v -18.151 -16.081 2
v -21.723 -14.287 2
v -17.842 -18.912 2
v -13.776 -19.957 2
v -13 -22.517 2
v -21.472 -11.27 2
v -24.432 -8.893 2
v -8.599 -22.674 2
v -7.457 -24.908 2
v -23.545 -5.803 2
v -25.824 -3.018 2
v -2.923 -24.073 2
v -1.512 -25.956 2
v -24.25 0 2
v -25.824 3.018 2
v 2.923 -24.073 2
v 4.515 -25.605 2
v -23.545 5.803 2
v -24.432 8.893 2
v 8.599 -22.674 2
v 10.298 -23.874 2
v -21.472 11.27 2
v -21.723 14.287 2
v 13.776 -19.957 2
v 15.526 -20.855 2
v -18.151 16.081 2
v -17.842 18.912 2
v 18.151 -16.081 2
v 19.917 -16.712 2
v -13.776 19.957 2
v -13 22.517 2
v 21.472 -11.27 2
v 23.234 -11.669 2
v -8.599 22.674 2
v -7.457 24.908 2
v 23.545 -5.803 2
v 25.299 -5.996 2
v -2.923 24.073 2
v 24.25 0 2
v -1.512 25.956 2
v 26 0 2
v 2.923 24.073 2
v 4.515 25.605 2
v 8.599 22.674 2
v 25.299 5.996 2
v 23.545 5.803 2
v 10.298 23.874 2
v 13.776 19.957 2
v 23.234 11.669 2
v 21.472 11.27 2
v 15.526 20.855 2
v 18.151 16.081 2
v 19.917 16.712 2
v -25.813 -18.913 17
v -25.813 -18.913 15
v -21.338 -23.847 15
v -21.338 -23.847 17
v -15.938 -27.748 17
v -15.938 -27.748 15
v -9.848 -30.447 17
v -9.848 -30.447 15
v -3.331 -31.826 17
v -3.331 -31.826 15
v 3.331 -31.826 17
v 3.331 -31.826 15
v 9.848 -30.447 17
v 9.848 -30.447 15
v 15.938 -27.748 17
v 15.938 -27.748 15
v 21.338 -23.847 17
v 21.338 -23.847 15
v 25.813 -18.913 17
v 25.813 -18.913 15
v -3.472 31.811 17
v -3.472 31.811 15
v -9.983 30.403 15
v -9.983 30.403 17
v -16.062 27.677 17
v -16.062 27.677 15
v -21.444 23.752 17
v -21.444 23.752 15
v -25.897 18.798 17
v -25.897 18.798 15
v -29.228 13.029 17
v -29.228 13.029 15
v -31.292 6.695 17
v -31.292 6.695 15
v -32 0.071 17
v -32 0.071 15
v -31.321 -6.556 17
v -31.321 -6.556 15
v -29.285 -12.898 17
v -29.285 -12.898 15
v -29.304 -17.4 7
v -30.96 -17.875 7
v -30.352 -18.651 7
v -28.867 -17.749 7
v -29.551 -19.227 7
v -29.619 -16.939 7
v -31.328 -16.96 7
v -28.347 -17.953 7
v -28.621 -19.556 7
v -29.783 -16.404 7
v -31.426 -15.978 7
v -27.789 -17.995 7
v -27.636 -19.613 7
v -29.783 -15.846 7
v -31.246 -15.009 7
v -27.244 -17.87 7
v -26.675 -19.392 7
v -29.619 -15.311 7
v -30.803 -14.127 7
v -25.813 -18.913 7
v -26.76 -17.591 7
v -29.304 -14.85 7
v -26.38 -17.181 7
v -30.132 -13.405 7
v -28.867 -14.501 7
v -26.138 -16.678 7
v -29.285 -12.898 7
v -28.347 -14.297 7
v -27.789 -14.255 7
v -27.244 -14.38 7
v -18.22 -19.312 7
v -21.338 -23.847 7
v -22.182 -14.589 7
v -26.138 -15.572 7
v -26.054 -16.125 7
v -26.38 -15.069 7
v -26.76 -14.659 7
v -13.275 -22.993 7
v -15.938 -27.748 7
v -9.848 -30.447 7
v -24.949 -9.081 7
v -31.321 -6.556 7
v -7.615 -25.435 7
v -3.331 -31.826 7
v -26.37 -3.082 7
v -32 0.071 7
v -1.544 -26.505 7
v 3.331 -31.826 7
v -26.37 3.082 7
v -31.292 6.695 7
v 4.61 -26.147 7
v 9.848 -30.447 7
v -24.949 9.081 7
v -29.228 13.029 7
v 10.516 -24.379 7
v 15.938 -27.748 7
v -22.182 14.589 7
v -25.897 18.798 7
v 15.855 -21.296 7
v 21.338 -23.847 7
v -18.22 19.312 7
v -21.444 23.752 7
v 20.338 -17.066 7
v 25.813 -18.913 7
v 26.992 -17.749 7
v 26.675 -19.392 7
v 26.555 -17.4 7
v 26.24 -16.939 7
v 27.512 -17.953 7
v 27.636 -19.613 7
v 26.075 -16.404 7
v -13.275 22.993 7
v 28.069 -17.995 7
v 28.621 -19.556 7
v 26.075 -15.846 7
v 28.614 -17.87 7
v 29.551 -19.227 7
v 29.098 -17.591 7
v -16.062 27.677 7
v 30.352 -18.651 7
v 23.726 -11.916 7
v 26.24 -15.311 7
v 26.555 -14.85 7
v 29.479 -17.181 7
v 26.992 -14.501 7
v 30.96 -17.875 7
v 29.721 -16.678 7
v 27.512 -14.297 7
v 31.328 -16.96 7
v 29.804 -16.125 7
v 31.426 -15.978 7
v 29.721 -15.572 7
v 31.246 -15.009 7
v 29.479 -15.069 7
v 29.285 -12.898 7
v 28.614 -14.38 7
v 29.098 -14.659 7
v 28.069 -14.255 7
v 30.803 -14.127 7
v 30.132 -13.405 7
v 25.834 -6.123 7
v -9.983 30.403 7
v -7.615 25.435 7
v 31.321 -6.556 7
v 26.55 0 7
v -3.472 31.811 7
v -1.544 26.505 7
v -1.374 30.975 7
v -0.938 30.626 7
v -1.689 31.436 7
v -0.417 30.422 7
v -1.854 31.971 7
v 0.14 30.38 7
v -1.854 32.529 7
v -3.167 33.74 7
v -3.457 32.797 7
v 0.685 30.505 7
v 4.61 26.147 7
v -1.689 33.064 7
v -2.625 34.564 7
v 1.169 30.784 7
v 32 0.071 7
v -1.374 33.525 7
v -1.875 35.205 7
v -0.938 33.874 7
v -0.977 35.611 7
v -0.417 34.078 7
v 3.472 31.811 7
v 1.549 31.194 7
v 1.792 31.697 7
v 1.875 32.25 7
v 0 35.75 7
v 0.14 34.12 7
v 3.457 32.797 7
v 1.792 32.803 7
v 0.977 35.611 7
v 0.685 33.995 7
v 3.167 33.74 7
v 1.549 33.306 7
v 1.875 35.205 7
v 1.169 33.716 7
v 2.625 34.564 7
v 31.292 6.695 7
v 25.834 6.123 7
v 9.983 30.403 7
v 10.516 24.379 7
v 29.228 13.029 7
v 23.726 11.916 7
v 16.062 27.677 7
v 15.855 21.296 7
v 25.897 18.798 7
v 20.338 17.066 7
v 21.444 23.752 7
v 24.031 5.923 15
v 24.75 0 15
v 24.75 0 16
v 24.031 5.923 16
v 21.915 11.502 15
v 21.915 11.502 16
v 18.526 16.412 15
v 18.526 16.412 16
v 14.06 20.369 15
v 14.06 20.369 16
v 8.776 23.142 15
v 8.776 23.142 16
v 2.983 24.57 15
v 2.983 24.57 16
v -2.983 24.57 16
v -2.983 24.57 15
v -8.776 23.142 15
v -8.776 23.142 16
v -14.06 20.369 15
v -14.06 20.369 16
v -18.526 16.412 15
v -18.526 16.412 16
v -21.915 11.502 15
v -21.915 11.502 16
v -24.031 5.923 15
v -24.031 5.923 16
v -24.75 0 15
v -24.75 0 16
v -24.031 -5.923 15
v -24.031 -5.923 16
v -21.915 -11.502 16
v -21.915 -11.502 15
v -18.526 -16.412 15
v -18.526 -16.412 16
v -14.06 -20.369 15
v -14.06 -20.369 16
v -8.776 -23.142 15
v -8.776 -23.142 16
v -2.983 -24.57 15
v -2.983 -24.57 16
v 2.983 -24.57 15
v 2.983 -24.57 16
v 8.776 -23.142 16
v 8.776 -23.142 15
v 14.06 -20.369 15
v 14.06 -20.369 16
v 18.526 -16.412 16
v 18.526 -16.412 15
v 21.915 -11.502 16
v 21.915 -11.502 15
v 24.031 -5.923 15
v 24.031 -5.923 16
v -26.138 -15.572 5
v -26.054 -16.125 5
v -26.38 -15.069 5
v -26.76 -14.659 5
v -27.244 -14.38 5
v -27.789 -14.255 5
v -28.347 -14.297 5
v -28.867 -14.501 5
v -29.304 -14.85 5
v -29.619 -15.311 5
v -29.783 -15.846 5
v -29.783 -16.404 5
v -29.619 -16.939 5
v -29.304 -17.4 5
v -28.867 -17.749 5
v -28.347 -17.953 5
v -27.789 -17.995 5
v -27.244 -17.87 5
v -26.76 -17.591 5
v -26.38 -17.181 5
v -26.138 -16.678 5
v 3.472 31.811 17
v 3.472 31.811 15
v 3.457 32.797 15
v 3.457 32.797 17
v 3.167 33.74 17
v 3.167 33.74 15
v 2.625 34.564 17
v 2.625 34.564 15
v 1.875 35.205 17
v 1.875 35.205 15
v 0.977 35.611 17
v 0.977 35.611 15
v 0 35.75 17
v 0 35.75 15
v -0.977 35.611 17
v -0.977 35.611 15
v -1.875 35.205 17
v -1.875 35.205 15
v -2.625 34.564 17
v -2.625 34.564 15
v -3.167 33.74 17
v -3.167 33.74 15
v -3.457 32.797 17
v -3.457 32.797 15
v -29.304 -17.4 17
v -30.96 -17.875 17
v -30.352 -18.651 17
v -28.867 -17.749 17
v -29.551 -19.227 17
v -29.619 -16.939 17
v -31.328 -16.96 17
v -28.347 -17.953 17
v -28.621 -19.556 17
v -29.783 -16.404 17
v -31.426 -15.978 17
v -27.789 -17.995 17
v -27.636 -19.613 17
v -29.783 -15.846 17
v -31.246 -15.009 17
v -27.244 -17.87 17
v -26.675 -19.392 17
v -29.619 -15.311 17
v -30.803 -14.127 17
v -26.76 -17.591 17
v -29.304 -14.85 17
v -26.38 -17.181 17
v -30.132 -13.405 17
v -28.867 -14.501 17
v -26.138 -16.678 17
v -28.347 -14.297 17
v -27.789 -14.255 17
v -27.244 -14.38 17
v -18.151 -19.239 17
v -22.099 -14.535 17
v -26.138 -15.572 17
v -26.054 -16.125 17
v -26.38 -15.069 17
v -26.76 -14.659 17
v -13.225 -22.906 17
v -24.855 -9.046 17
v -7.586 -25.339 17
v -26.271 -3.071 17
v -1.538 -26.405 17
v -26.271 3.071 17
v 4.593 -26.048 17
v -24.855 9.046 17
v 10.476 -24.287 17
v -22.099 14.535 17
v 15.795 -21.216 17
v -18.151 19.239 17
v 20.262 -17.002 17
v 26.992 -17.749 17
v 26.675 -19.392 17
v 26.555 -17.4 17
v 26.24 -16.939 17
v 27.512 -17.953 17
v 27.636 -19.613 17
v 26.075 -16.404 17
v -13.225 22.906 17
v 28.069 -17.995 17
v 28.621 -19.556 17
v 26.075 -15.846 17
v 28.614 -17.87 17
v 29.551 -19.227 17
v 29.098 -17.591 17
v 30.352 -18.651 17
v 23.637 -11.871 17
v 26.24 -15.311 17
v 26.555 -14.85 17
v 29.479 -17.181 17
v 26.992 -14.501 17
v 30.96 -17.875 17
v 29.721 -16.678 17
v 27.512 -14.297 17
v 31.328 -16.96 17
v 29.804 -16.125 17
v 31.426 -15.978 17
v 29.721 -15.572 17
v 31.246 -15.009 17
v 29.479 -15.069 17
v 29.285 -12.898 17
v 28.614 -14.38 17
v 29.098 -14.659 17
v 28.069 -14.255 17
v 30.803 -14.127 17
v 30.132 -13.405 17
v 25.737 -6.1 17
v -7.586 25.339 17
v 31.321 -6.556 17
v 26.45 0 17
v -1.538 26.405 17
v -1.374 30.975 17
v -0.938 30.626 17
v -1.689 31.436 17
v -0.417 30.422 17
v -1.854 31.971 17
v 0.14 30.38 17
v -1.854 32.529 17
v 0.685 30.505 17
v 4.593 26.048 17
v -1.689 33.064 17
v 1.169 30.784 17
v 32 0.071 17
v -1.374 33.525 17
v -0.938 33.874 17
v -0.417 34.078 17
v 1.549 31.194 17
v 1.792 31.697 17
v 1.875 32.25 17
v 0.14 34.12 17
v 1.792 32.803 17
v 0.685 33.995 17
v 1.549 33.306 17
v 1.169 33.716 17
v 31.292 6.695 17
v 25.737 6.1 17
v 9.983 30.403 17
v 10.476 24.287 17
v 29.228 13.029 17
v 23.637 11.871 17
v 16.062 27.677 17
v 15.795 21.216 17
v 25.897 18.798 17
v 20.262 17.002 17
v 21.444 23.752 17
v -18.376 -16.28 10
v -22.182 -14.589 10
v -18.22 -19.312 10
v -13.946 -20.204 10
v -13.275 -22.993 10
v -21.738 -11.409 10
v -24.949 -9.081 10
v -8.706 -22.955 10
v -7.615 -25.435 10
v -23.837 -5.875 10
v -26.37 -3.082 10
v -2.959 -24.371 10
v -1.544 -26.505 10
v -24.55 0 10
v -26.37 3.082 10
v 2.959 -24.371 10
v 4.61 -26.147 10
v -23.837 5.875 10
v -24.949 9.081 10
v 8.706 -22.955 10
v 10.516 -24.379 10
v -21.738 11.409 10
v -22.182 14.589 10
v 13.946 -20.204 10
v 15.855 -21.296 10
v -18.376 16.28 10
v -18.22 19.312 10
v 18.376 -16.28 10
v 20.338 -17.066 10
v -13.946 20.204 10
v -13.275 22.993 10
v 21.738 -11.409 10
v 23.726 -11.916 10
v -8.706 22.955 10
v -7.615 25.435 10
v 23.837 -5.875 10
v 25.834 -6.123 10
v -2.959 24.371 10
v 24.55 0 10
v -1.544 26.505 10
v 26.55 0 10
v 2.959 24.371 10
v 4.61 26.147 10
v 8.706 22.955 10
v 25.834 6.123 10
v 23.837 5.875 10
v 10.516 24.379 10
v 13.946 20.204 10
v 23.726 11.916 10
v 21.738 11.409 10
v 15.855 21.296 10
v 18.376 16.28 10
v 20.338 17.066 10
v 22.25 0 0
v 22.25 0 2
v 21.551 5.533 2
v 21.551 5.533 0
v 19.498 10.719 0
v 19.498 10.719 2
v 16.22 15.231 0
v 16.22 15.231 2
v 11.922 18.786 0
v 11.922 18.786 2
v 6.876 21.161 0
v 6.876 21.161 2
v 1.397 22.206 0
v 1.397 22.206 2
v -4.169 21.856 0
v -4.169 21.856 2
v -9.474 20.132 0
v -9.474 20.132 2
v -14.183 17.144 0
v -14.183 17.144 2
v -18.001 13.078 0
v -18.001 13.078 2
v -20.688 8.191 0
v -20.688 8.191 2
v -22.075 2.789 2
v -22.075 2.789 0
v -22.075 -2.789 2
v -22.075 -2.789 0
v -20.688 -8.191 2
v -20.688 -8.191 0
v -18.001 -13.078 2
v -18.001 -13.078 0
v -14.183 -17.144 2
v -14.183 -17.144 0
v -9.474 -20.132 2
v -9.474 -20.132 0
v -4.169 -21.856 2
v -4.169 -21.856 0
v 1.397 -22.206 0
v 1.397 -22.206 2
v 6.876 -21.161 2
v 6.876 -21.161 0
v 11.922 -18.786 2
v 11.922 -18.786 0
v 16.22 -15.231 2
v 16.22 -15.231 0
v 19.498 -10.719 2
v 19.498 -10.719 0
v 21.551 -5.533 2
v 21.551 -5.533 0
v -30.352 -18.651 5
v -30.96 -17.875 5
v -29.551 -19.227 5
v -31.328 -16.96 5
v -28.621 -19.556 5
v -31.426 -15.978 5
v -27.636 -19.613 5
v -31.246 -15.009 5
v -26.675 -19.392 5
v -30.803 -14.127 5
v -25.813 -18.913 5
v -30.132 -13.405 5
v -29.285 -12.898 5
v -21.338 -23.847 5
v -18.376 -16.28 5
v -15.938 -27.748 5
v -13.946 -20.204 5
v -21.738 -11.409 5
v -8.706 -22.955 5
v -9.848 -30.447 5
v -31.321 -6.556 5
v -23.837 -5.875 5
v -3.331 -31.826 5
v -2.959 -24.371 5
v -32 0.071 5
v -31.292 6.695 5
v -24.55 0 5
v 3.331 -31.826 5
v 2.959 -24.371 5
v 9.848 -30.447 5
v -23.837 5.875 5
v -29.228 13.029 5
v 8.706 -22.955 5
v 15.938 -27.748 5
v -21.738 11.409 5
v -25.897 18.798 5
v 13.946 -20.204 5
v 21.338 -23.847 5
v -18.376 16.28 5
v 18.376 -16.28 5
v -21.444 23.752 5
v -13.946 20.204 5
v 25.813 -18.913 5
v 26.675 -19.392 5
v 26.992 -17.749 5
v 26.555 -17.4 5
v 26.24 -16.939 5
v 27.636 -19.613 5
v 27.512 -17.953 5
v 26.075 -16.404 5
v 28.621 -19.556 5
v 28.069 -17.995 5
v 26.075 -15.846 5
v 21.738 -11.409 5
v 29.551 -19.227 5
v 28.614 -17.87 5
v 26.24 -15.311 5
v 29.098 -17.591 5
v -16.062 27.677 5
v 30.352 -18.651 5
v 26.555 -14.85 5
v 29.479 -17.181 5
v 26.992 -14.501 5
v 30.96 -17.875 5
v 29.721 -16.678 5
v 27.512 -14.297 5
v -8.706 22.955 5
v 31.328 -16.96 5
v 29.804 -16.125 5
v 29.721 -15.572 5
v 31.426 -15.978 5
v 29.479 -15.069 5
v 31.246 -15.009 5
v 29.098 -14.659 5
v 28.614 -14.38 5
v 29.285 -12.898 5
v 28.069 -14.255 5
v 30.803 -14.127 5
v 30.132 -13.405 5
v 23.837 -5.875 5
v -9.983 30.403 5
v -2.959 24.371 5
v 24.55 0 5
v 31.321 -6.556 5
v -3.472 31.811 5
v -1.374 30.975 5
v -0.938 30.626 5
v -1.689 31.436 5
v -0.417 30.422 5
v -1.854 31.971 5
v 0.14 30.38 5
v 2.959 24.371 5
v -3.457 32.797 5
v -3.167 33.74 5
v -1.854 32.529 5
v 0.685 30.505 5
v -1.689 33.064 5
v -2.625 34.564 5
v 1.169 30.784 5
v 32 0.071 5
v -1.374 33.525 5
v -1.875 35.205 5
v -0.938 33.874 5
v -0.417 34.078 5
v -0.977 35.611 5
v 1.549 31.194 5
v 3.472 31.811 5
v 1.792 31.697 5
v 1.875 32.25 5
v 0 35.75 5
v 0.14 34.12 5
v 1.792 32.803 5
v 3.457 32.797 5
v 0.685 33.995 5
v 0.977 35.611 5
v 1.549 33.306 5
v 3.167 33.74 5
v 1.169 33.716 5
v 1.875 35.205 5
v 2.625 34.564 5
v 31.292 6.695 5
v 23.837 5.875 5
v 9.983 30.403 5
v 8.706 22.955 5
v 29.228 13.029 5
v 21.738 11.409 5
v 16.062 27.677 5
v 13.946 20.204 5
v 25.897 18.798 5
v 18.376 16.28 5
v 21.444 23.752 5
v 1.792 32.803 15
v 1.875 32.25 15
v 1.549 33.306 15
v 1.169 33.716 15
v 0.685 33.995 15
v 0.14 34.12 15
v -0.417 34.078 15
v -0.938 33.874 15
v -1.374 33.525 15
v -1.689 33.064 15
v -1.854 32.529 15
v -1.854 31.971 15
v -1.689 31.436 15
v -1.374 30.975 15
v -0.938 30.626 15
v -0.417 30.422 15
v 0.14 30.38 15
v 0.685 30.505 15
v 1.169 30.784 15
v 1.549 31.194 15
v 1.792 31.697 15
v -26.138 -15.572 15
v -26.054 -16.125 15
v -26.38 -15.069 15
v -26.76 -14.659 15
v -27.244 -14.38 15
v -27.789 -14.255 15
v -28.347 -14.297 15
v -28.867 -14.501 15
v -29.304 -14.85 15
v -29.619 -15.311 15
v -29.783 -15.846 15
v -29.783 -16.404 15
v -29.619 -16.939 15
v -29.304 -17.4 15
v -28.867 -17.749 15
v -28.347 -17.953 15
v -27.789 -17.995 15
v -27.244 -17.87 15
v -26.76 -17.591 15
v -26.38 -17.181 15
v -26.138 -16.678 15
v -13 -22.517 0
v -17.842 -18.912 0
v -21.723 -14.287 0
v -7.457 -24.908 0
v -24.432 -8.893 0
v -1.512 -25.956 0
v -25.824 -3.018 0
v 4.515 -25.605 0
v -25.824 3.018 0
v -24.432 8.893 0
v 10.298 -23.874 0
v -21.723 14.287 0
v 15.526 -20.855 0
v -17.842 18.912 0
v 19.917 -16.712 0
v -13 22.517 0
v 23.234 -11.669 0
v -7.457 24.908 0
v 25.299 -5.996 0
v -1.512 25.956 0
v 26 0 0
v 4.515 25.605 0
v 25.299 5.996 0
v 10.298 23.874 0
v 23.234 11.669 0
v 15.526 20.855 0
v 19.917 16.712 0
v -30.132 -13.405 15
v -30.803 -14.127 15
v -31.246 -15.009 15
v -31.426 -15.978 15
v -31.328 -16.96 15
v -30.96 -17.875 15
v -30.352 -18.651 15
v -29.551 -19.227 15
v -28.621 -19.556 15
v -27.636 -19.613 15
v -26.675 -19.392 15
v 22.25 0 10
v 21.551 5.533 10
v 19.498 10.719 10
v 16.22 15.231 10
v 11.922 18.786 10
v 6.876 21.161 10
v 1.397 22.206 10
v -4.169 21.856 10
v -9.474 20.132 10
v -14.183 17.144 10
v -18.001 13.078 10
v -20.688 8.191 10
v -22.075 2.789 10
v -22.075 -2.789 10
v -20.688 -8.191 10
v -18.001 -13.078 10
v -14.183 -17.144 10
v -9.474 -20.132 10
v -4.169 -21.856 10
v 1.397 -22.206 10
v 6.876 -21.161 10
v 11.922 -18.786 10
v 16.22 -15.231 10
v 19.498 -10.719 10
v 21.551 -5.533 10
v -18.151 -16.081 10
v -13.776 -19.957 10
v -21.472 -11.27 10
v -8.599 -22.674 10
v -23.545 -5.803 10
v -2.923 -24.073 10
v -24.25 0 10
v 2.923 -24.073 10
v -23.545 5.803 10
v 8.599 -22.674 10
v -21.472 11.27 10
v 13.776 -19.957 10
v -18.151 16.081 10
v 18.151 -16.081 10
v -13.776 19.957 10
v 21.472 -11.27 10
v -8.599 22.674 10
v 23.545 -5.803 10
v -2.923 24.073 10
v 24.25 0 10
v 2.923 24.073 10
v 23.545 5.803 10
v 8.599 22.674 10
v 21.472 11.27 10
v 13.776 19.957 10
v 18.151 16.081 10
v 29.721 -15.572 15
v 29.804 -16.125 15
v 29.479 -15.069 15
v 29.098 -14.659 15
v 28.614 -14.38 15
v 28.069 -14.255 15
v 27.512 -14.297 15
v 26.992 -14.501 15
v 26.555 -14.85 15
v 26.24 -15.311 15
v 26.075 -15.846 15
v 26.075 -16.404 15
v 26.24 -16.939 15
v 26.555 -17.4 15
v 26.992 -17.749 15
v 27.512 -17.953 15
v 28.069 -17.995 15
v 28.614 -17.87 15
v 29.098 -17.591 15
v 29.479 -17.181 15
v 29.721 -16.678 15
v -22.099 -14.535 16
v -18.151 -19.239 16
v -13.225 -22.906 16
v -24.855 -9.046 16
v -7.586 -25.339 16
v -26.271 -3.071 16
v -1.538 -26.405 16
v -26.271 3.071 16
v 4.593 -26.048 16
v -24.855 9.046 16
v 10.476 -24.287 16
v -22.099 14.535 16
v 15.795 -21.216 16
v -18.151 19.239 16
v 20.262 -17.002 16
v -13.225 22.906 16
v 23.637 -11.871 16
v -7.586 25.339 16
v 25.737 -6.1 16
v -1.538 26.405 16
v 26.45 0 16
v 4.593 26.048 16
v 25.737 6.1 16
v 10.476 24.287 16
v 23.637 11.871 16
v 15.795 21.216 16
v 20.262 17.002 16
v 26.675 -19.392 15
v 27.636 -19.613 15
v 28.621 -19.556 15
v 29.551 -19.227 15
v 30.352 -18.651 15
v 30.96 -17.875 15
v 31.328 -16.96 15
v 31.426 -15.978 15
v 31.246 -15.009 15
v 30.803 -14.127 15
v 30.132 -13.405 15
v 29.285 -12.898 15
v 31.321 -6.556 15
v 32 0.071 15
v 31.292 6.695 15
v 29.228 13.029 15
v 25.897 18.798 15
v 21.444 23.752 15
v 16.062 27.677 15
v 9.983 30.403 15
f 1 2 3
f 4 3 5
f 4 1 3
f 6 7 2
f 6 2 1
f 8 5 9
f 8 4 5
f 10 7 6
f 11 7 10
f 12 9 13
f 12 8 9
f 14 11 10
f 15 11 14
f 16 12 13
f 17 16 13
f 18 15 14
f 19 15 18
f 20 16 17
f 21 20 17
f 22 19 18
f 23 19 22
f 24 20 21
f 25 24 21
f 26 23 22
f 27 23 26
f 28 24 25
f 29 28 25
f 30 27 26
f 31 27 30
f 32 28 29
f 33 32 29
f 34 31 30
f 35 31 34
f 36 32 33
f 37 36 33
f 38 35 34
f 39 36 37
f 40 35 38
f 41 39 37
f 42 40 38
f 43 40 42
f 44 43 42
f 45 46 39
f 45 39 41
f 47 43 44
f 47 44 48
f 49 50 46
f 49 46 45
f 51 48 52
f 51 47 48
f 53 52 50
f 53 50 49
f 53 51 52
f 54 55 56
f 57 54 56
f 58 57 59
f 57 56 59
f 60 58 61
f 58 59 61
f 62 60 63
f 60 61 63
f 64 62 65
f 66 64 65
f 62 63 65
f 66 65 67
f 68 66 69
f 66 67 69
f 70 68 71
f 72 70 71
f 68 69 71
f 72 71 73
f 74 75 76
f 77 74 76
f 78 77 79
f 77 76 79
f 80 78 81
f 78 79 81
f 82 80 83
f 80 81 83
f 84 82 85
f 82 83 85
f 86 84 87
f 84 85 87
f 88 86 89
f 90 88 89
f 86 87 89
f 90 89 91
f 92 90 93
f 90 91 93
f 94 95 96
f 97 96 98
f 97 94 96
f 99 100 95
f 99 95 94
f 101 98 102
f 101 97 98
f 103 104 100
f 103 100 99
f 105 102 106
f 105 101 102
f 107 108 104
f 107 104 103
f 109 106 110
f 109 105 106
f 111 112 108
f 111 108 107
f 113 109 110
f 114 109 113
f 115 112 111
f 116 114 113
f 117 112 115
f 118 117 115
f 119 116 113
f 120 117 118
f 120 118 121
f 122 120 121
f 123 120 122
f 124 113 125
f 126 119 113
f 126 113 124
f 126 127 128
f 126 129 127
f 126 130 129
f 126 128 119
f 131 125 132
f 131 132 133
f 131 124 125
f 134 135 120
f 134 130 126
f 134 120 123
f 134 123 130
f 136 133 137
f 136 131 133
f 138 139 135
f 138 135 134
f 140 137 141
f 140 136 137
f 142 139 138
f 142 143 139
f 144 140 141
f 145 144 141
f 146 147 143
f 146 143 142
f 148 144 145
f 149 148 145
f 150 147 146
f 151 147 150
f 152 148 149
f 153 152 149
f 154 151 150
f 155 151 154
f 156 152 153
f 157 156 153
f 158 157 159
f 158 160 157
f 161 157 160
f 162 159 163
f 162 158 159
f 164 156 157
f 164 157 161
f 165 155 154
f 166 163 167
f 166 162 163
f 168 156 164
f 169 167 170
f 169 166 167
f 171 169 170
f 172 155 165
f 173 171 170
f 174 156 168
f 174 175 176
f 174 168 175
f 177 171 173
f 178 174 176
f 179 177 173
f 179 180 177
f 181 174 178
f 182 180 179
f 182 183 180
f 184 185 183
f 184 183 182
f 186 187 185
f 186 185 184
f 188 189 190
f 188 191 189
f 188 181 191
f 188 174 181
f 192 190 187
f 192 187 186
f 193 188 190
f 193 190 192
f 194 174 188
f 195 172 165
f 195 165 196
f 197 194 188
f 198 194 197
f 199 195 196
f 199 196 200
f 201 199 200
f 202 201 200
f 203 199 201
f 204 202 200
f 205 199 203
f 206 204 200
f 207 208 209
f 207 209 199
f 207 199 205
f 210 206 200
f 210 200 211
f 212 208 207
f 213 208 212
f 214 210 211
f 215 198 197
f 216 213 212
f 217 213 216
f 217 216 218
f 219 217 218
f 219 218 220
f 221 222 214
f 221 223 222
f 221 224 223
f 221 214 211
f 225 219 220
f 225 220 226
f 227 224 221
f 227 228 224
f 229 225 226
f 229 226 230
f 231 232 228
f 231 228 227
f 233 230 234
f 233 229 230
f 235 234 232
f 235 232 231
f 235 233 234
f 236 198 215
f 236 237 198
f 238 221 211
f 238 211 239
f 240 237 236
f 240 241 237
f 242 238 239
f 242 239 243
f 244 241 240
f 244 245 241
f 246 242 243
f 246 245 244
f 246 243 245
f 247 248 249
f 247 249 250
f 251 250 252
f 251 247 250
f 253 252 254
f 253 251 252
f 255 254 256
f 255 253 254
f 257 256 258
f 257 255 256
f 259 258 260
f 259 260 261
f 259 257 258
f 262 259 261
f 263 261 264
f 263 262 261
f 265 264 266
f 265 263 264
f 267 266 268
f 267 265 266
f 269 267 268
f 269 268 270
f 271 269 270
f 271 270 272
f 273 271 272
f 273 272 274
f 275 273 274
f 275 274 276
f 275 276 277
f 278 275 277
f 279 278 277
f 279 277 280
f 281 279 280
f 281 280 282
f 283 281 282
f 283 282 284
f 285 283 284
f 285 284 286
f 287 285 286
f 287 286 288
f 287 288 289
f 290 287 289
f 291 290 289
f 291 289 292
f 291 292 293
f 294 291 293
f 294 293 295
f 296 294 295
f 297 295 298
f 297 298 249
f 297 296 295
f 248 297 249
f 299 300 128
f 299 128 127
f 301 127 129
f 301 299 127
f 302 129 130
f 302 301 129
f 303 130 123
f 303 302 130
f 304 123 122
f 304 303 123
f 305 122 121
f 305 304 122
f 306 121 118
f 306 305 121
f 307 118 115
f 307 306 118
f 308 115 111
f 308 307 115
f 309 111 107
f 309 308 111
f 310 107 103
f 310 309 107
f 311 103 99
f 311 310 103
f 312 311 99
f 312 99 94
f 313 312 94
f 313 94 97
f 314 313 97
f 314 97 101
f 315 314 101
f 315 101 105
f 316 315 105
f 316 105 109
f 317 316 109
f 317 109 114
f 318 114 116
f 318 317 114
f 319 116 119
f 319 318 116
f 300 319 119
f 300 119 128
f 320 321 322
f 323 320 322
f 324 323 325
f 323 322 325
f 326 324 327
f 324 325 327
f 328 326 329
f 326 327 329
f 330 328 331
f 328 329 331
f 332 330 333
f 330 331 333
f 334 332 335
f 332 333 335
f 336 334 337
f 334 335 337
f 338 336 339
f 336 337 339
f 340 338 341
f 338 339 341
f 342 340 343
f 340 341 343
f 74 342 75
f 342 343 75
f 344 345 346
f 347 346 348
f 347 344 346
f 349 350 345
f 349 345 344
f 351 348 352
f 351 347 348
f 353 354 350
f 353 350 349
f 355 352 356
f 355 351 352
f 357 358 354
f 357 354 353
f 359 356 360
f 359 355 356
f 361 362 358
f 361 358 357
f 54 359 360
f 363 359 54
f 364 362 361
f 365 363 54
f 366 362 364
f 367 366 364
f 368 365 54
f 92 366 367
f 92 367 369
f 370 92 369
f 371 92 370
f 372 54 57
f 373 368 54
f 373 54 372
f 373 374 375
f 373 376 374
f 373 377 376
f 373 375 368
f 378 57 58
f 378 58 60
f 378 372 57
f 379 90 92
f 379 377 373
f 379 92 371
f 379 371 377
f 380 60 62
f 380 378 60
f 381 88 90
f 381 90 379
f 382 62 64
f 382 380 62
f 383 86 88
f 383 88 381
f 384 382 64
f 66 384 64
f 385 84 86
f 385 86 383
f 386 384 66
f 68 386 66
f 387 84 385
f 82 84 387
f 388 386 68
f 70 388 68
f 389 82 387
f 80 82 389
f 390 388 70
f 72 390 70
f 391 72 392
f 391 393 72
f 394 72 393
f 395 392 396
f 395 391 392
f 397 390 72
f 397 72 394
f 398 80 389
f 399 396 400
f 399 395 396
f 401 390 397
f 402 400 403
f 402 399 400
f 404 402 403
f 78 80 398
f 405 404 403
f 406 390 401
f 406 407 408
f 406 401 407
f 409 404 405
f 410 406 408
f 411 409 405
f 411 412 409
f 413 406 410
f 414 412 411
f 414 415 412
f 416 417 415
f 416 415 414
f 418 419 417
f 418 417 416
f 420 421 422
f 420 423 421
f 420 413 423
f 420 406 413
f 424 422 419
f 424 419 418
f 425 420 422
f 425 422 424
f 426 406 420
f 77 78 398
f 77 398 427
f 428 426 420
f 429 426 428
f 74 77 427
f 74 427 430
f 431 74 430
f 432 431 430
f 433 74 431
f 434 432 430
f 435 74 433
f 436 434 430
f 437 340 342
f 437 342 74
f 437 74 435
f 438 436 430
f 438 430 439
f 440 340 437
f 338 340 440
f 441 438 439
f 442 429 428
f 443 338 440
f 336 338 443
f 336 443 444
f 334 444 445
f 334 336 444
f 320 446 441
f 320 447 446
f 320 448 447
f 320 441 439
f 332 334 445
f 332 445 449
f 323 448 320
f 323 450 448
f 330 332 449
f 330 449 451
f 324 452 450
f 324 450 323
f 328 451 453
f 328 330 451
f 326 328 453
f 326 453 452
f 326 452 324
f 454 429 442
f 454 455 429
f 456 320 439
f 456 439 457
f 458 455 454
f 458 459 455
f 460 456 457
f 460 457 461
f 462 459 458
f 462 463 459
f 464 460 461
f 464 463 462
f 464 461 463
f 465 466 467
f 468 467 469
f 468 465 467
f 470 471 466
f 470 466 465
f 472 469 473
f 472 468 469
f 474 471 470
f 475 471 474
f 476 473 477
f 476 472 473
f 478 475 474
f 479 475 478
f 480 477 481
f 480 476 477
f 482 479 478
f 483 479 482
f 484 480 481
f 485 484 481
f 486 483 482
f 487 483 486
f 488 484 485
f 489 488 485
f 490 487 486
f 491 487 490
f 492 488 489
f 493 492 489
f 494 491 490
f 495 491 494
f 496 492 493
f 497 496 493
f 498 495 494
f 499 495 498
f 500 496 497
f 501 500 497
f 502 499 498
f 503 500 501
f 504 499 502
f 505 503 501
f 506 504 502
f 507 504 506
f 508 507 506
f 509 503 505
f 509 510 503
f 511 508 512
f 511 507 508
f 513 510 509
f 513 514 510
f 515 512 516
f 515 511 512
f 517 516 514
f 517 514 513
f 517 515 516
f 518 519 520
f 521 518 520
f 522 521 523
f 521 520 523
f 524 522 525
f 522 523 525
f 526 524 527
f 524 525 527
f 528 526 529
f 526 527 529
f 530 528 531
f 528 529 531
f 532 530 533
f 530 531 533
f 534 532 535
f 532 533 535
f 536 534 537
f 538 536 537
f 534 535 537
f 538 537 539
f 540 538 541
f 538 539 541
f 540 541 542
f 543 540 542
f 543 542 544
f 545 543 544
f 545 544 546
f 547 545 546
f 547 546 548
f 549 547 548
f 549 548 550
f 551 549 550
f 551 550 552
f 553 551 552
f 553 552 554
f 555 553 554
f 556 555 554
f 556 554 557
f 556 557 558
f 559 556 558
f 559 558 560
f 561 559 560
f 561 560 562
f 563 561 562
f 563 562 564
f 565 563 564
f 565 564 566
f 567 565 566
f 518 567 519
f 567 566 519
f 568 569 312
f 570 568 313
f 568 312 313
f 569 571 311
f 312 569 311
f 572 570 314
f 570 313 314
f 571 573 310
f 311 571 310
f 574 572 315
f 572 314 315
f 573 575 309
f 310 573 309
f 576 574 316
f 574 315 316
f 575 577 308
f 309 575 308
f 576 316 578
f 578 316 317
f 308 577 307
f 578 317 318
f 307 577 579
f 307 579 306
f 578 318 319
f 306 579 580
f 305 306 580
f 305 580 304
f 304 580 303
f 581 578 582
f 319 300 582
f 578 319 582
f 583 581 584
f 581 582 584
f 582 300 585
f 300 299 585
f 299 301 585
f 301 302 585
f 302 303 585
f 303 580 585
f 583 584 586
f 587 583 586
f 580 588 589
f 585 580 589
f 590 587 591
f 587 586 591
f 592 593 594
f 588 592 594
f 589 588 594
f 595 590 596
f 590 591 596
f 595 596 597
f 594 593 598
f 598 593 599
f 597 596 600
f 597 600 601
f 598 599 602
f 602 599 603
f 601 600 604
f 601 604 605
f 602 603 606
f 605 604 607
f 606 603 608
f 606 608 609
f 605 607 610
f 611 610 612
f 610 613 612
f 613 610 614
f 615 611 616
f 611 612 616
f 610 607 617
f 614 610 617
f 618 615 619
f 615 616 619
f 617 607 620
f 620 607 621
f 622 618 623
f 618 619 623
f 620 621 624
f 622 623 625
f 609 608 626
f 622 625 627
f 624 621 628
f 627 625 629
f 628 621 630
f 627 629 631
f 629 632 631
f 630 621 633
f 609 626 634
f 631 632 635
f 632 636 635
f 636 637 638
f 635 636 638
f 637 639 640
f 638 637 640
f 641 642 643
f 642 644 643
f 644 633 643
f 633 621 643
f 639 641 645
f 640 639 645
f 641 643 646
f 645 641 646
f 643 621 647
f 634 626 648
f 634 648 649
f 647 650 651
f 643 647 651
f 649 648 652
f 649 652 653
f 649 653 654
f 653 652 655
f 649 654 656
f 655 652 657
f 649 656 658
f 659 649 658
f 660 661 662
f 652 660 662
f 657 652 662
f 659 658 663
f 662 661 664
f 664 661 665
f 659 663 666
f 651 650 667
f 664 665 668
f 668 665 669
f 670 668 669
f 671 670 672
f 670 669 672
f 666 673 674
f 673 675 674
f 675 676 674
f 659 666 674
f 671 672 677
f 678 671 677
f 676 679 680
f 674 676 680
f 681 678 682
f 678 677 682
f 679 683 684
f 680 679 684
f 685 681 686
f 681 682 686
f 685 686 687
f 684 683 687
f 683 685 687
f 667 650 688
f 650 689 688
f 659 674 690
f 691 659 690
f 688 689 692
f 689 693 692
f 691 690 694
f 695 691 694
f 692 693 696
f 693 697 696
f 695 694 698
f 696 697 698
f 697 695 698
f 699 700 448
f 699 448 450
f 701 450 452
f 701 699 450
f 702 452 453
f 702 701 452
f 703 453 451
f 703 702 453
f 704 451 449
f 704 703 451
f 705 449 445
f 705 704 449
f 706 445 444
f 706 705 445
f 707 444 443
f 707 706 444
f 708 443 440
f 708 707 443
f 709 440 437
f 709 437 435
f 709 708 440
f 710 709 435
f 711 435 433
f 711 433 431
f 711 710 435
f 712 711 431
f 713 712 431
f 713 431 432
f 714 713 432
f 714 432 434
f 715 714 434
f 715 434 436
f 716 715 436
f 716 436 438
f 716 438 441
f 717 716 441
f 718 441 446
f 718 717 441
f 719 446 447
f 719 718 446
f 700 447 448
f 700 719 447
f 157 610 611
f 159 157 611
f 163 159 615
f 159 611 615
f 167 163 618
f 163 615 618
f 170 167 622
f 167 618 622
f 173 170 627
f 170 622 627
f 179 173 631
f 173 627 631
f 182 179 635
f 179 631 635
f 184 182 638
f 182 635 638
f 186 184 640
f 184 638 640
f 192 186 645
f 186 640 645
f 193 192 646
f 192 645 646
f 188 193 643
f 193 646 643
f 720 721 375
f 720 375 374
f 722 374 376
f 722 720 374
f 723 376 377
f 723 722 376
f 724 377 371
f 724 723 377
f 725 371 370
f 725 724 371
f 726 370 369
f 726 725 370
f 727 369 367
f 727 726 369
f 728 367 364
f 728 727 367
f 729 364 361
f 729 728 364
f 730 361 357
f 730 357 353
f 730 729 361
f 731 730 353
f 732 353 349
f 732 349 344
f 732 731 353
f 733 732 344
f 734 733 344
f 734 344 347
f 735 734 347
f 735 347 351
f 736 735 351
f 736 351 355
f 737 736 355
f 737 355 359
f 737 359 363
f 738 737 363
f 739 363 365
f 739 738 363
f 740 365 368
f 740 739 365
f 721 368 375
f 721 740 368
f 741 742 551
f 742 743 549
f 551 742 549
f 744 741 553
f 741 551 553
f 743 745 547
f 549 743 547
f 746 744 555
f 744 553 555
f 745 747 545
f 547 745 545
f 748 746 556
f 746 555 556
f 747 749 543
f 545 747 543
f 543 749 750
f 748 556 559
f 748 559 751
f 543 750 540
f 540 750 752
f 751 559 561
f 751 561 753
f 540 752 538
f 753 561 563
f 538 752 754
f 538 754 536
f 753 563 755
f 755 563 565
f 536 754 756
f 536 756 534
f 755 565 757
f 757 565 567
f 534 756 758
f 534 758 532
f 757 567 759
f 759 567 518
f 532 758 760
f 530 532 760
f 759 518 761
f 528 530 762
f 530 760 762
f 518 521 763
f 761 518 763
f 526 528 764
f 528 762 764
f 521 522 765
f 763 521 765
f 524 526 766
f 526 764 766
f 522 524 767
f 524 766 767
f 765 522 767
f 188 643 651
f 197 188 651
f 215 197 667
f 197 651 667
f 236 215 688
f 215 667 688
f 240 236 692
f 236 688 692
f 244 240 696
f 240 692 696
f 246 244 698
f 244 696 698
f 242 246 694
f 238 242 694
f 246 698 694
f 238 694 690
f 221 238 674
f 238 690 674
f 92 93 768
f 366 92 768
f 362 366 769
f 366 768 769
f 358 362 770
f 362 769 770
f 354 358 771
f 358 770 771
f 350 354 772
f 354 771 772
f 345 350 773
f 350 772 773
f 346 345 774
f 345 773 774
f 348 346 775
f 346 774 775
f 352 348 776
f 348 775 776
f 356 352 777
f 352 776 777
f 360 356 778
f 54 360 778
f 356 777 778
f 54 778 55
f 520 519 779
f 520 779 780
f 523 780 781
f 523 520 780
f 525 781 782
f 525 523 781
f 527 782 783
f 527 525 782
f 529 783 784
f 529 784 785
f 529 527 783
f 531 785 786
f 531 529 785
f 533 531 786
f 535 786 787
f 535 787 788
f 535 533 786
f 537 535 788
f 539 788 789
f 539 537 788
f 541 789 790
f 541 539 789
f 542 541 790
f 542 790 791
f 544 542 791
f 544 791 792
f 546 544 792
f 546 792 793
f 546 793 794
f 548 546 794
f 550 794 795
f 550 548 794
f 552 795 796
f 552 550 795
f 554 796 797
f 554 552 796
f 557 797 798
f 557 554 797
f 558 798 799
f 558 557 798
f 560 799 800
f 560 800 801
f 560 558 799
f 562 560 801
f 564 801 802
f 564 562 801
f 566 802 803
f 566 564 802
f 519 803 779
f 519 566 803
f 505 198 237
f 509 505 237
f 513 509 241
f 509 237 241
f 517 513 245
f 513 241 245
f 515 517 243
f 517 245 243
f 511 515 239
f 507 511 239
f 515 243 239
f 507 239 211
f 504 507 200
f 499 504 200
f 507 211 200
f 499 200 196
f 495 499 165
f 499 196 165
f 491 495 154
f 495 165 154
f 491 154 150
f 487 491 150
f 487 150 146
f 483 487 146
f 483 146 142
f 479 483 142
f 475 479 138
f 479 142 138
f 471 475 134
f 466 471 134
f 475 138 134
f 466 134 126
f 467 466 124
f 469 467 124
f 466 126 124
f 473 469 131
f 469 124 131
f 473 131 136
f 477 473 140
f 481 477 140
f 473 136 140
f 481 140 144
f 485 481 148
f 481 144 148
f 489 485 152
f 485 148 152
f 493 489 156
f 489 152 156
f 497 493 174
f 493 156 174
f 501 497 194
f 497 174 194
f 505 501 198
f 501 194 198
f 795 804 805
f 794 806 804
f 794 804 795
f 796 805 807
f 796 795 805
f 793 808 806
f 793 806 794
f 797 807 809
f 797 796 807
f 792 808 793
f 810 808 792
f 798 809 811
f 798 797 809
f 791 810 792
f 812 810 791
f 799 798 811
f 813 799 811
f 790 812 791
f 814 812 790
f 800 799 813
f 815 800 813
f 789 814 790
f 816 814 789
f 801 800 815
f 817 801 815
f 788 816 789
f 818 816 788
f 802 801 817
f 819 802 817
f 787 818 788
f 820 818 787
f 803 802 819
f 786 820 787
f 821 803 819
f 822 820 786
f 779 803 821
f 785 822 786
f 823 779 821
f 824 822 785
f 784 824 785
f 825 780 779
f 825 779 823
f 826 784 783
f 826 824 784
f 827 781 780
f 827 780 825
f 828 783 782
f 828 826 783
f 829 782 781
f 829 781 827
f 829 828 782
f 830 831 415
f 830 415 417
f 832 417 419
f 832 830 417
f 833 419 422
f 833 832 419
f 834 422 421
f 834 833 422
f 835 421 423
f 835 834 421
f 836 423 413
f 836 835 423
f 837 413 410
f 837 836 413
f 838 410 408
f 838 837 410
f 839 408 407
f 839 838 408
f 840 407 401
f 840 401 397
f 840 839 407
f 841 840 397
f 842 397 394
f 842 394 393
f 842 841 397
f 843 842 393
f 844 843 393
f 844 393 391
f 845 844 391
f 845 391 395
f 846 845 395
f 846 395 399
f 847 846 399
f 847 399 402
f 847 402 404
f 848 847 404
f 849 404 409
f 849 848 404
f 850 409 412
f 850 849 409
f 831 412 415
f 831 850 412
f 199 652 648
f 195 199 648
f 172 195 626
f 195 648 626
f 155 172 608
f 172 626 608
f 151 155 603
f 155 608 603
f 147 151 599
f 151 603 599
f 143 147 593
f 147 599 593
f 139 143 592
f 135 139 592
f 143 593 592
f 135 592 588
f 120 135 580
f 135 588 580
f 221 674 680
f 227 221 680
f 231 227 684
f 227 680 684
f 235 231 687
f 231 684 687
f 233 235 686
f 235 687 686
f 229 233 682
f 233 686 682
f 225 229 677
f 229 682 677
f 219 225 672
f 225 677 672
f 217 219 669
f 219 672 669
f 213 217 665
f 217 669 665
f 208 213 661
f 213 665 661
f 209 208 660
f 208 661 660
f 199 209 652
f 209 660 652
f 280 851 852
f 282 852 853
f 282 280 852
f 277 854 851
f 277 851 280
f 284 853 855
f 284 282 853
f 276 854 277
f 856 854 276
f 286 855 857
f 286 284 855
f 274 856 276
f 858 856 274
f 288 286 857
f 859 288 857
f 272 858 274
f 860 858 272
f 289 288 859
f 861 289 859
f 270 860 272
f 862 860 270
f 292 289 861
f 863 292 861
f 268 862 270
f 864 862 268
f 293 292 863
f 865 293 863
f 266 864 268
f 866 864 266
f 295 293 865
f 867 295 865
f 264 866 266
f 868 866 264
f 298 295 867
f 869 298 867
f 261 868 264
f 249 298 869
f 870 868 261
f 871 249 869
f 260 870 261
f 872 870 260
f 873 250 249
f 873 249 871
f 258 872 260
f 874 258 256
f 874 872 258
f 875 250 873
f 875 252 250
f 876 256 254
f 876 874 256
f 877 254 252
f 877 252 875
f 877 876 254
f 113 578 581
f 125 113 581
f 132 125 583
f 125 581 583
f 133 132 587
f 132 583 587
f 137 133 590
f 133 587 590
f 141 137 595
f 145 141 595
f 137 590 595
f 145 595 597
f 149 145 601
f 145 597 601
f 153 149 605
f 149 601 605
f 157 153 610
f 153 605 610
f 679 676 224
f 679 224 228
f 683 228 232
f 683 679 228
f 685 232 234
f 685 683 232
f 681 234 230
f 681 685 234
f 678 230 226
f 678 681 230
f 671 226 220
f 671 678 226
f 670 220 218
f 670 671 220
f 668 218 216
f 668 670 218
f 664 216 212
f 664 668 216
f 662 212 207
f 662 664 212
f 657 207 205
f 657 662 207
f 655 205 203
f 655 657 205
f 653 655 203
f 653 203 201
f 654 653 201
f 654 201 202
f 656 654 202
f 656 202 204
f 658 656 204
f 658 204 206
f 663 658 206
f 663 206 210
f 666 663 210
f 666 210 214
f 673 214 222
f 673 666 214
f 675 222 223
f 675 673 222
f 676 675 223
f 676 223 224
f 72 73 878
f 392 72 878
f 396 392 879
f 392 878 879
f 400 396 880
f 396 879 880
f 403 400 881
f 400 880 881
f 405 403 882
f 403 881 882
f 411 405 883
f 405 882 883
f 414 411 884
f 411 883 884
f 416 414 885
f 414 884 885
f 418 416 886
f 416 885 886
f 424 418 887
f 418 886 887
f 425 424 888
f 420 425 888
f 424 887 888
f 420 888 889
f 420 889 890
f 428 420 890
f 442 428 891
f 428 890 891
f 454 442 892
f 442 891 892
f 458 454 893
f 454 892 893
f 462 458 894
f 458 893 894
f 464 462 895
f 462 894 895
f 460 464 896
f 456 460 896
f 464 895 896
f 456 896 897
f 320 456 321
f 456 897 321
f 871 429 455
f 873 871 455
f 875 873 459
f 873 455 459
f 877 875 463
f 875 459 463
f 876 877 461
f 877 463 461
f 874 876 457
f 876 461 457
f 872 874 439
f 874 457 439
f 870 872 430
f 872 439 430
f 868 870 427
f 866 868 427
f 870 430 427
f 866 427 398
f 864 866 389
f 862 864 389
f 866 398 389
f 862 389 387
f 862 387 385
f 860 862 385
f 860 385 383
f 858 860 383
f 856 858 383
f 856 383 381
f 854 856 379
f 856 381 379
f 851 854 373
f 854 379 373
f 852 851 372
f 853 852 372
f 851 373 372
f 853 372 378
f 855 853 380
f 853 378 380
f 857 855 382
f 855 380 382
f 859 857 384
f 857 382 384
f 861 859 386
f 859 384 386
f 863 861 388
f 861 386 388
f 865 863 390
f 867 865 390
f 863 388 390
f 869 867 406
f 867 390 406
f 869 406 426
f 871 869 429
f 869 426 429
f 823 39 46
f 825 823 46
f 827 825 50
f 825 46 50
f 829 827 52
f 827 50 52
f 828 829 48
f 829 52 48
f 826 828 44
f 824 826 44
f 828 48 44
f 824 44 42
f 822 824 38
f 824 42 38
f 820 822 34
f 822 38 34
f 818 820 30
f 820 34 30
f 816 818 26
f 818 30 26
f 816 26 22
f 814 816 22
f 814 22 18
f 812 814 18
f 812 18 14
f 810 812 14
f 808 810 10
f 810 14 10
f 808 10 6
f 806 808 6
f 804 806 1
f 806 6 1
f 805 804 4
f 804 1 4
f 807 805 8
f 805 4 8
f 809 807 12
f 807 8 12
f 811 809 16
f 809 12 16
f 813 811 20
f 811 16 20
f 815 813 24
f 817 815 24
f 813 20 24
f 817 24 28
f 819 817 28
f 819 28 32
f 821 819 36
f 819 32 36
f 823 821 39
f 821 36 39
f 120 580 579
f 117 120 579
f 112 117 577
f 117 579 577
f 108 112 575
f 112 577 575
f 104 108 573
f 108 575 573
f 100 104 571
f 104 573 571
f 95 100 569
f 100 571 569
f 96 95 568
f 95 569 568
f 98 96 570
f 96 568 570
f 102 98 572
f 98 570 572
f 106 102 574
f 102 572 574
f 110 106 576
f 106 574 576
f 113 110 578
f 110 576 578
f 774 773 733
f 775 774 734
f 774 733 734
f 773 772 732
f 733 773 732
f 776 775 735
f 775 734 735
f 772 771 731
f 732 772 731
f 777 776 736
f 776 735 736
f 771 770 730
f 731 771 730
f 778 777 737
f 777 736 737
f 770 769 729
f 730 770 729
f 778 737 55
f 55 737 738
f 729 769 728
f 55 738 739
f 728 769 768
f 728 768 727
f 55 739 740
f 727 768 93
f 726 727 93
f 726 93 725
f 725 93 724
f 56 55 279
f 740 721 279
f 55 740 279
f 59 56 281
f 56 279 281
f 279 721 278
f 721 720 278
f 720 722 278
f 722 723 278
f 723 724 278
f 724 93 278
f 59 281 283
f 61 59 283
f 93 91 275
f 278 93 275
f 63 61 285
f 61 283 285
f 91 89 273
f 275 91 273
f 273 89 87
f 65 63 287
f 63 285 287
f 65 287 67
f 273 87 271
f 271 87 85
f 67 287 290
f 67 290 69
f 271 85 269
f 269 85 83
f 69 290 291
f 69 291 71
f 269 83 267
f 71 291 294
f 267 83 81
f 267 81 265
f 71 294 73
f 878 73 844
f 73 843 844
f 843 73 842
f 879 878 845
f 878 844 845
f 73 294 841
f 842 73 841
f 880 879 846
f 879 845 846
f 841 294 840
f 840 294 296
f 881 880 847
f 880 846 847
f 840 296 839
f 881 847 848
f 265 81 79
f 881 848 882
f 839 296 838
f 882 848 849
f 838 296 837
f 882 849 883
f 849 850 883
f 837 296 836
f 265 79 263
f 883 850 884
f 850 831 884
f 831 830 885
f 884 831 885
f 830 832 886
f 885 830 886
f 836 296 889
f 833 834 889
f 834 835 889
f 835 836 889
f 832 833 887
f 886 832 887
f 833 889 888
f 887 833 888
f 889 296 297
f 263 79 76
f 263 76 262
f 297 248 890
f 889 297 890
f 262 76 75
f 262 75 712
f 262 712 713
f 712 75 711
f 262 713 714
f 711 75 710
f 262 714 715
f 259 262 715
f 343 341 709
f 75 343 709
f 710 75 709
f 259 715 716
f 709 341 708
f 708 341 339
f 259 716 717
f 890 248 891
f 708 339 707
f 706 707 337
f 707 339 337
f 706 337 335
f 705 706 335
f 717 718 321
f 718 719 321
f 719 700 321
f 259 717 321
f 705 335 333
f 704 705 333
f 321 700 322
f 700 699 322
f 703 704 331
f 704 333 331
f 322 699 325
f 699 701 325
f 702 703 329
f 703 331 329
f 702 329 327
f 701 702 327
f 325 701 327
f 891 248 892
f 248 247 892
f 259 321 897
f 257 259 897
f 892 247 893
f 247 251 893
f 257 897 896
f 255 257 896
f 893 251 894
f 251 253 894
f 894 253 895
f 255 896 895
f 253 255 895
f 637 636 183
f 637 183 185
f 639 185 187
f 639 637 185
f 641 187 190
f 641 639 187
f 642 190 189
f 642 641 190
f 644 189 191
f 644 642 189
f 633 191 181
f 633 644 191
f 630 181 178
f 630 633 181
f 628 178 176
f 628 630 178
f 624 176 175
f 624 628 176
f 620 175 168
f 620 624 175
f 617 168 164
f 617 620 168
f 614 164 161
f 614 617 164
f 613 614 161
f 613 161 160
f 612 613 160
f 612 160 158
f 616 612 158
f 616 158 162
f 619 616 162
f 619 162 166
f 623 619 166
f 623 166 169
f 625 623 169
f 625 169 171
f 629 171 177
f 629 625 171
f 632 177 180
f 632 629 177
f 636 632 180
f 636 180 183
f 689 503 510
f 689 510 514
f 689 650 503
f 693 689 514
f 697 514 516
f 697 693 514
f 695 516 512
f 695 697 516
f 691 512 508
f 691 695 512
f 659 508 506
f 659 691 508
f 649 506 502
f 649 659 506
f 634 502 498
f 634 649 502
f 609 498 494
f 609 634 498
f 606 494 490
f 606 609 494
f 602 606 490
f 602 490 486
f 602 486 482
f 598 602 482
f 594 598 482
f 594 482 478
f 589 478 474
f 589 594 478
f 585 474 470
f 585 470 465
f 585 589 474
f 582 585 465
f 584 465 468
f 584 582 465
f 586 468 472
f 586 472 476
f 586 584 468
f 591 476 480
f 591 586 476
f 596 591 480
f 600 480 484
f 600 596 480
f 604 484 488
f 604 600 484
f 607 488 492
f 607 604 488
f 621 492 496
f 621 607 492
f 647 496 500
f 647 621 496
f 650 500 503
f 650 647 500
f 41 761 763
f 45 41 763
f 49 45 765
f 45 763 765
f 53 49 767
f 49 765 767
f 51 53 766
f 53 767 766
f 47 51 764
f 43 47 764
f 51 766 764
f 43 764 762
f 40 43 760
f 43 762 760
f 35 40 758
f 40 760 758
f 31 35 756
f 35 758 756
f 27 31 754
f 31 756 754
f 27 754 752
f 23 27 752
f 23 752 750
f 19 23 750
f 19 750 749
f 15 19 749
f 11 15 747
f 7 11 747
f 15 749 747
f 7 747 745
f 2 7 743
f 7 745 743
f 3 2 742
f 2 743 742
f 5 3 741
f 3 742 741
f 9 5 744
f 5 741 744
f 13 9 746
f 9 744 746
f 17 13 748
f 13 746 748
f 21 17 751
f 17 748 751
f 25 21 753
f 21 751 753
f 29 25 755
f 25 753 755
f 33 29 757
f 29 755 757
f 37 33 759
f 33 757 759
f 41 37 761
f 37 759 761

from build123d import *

# Parameters (mm, degrees)
F0_R      = 26
F1_DEPTH  = 2
F2_R      = 22.25
F3_DEPTH  = 25
F4_R      = 24.25
F4_R_2    = 22.25
F5_DEPTH  = 8
F7_R      = 1.875
F7_R_2    = 24.55
F8_DEPTH  = 2
F9_R      = 26.55
F9_R_2    = 24.55
F10_DEPTH = 3
F12_R     = 1.875
F12_R_2   = 24.75
F13_DEPTH = 2
F14_R     = 26.45
F14_R_2   = 24.75
F15_DEPTH = 1


with BuildPart() as f1:
    # F0 (on Top) → F1 (new body)
    with BuildSketch(Plane.XY):
        Circle(F0_R)
    extrude(amount=F1_DEPTH)

    # F2 (on face) → F3 (cut)
    with BuildSketch(Plane.XY.offset(2)):
        Circle(F2_R)
    extrude(amount=-F3_DEPTH, mode=Mode.SUBTRACT)

    # F4 (on face) → F5 (join)
    with BuildSketch(Plane.XY.offset(2)):
        Circle(F4_R)
        Circle(F4_R_2, mode=Mode.SUBTRACT)
    extrude(amount=F5_DEPTH)


with BuildPart() as f8:
    # F7 (on offset) → F8 (new body)
    with BuildSketch(Plane.XY.offset(5)):
        with BuildLine():
            ThreePointArc((-3.472365, 31.811047), (-27.712813, 16), (-29.285357, -12.898367))
            ThreePointArc((-29.285357, -12.898367), (-30.960408, -17.875), (-25.812992, -18.91268))
            ThreePointArc((-25.812992, -18.91268), (0, -32), (25.812992, -18.91268))
            ThreePointArc((25.812992, -18.91268), (30.960408, -17.875), (29.285357, -12.898367))
            ThreePointArc((29.285357, -12.898367), (27.712813, 16), (3.472365, 31.811047))
            ThreePointArc((3.472365, 31.811047), (0, 35.75), (-3.472365, 31.811047))
        make_face()
        with Locations((-27.929319, -16.125)):
            Circle(F7_R, mode=Mode.SUBTRACT)
        with Locations((27.929319, -16.125)):
            Circle(F7_R, mode=Mode.SUBTRACT)
        Circle(F7_R_2, mode=Mode.SUBTRACT)
        with Locations((0, 32.25)):
            Circle(F7_R, mode=Mode.SUBTRACT)
    extrude(amount=F8_DEPTH)

    # F9 (on face) → F10 (join)
    with BuildSketch(Plane.XY.offset(7)):
        Circle(F9_R)
        Circle(F9_R_2, mode=Mode.SUBTRACT)
    extrude(amount=F10_DEPTH)


with BuildPart() as f13:
    # F12 (on offset) → F13 (new body)
    with BuildSketch(Plane.XY.offset(15)):
        with BuildLine():
            ThreePointArc((-3.472365, 31.811047), (-27.712813, 16), (-29.285357, -12.898367))
            ThreePointArc((-29.285357, -12.898367), (-30.960408, -17.875), (-25.812992, -18.91268))
            ThreePointArc((-25.812992, -18.91268), (0, -32), (25.812992, -18.91268))
            ThreePointArc((25.812992, -18.91268), (30.960408, -17.875), (29.285357, -12.898367))
            ThreePointArc((29.285357, -12.898367), (27.712813, 16), (3.472365, 31.811047))
            ThreePointArc((3.472365, 31.811047), (0, 35.75), (-3.472365, 31.811047))
        make_face()
        with Locations((-27.929319, -16.125)):
            Circle(F12_R, mode=Mode.SUBTRACT)
        Circle(F12_R_2, mode=Mode.SUBTRACT)
        with Locations((27.929319, -16.125)):
            Circle(F12_R, mode=Mode.SUBTRACT)
        with Locations((0, 32.25)):
            Circle(F12_R, mode=Mode.SUBTRACT)
    extrude(amount=F13_DEPTH)

    # F14 (on face) → F15 (cut)
    with BuildSketch(Plane.XY.offset(17)):
        Circle(F14_R)
        Circle(F14_R_2, mode=Mode.SUBTRACT)
    extrude(amount=-F15_DEPTH, mode=Mode.SUBTRACT)


solid = Compound([f1.part, f8.part, f13.part])
